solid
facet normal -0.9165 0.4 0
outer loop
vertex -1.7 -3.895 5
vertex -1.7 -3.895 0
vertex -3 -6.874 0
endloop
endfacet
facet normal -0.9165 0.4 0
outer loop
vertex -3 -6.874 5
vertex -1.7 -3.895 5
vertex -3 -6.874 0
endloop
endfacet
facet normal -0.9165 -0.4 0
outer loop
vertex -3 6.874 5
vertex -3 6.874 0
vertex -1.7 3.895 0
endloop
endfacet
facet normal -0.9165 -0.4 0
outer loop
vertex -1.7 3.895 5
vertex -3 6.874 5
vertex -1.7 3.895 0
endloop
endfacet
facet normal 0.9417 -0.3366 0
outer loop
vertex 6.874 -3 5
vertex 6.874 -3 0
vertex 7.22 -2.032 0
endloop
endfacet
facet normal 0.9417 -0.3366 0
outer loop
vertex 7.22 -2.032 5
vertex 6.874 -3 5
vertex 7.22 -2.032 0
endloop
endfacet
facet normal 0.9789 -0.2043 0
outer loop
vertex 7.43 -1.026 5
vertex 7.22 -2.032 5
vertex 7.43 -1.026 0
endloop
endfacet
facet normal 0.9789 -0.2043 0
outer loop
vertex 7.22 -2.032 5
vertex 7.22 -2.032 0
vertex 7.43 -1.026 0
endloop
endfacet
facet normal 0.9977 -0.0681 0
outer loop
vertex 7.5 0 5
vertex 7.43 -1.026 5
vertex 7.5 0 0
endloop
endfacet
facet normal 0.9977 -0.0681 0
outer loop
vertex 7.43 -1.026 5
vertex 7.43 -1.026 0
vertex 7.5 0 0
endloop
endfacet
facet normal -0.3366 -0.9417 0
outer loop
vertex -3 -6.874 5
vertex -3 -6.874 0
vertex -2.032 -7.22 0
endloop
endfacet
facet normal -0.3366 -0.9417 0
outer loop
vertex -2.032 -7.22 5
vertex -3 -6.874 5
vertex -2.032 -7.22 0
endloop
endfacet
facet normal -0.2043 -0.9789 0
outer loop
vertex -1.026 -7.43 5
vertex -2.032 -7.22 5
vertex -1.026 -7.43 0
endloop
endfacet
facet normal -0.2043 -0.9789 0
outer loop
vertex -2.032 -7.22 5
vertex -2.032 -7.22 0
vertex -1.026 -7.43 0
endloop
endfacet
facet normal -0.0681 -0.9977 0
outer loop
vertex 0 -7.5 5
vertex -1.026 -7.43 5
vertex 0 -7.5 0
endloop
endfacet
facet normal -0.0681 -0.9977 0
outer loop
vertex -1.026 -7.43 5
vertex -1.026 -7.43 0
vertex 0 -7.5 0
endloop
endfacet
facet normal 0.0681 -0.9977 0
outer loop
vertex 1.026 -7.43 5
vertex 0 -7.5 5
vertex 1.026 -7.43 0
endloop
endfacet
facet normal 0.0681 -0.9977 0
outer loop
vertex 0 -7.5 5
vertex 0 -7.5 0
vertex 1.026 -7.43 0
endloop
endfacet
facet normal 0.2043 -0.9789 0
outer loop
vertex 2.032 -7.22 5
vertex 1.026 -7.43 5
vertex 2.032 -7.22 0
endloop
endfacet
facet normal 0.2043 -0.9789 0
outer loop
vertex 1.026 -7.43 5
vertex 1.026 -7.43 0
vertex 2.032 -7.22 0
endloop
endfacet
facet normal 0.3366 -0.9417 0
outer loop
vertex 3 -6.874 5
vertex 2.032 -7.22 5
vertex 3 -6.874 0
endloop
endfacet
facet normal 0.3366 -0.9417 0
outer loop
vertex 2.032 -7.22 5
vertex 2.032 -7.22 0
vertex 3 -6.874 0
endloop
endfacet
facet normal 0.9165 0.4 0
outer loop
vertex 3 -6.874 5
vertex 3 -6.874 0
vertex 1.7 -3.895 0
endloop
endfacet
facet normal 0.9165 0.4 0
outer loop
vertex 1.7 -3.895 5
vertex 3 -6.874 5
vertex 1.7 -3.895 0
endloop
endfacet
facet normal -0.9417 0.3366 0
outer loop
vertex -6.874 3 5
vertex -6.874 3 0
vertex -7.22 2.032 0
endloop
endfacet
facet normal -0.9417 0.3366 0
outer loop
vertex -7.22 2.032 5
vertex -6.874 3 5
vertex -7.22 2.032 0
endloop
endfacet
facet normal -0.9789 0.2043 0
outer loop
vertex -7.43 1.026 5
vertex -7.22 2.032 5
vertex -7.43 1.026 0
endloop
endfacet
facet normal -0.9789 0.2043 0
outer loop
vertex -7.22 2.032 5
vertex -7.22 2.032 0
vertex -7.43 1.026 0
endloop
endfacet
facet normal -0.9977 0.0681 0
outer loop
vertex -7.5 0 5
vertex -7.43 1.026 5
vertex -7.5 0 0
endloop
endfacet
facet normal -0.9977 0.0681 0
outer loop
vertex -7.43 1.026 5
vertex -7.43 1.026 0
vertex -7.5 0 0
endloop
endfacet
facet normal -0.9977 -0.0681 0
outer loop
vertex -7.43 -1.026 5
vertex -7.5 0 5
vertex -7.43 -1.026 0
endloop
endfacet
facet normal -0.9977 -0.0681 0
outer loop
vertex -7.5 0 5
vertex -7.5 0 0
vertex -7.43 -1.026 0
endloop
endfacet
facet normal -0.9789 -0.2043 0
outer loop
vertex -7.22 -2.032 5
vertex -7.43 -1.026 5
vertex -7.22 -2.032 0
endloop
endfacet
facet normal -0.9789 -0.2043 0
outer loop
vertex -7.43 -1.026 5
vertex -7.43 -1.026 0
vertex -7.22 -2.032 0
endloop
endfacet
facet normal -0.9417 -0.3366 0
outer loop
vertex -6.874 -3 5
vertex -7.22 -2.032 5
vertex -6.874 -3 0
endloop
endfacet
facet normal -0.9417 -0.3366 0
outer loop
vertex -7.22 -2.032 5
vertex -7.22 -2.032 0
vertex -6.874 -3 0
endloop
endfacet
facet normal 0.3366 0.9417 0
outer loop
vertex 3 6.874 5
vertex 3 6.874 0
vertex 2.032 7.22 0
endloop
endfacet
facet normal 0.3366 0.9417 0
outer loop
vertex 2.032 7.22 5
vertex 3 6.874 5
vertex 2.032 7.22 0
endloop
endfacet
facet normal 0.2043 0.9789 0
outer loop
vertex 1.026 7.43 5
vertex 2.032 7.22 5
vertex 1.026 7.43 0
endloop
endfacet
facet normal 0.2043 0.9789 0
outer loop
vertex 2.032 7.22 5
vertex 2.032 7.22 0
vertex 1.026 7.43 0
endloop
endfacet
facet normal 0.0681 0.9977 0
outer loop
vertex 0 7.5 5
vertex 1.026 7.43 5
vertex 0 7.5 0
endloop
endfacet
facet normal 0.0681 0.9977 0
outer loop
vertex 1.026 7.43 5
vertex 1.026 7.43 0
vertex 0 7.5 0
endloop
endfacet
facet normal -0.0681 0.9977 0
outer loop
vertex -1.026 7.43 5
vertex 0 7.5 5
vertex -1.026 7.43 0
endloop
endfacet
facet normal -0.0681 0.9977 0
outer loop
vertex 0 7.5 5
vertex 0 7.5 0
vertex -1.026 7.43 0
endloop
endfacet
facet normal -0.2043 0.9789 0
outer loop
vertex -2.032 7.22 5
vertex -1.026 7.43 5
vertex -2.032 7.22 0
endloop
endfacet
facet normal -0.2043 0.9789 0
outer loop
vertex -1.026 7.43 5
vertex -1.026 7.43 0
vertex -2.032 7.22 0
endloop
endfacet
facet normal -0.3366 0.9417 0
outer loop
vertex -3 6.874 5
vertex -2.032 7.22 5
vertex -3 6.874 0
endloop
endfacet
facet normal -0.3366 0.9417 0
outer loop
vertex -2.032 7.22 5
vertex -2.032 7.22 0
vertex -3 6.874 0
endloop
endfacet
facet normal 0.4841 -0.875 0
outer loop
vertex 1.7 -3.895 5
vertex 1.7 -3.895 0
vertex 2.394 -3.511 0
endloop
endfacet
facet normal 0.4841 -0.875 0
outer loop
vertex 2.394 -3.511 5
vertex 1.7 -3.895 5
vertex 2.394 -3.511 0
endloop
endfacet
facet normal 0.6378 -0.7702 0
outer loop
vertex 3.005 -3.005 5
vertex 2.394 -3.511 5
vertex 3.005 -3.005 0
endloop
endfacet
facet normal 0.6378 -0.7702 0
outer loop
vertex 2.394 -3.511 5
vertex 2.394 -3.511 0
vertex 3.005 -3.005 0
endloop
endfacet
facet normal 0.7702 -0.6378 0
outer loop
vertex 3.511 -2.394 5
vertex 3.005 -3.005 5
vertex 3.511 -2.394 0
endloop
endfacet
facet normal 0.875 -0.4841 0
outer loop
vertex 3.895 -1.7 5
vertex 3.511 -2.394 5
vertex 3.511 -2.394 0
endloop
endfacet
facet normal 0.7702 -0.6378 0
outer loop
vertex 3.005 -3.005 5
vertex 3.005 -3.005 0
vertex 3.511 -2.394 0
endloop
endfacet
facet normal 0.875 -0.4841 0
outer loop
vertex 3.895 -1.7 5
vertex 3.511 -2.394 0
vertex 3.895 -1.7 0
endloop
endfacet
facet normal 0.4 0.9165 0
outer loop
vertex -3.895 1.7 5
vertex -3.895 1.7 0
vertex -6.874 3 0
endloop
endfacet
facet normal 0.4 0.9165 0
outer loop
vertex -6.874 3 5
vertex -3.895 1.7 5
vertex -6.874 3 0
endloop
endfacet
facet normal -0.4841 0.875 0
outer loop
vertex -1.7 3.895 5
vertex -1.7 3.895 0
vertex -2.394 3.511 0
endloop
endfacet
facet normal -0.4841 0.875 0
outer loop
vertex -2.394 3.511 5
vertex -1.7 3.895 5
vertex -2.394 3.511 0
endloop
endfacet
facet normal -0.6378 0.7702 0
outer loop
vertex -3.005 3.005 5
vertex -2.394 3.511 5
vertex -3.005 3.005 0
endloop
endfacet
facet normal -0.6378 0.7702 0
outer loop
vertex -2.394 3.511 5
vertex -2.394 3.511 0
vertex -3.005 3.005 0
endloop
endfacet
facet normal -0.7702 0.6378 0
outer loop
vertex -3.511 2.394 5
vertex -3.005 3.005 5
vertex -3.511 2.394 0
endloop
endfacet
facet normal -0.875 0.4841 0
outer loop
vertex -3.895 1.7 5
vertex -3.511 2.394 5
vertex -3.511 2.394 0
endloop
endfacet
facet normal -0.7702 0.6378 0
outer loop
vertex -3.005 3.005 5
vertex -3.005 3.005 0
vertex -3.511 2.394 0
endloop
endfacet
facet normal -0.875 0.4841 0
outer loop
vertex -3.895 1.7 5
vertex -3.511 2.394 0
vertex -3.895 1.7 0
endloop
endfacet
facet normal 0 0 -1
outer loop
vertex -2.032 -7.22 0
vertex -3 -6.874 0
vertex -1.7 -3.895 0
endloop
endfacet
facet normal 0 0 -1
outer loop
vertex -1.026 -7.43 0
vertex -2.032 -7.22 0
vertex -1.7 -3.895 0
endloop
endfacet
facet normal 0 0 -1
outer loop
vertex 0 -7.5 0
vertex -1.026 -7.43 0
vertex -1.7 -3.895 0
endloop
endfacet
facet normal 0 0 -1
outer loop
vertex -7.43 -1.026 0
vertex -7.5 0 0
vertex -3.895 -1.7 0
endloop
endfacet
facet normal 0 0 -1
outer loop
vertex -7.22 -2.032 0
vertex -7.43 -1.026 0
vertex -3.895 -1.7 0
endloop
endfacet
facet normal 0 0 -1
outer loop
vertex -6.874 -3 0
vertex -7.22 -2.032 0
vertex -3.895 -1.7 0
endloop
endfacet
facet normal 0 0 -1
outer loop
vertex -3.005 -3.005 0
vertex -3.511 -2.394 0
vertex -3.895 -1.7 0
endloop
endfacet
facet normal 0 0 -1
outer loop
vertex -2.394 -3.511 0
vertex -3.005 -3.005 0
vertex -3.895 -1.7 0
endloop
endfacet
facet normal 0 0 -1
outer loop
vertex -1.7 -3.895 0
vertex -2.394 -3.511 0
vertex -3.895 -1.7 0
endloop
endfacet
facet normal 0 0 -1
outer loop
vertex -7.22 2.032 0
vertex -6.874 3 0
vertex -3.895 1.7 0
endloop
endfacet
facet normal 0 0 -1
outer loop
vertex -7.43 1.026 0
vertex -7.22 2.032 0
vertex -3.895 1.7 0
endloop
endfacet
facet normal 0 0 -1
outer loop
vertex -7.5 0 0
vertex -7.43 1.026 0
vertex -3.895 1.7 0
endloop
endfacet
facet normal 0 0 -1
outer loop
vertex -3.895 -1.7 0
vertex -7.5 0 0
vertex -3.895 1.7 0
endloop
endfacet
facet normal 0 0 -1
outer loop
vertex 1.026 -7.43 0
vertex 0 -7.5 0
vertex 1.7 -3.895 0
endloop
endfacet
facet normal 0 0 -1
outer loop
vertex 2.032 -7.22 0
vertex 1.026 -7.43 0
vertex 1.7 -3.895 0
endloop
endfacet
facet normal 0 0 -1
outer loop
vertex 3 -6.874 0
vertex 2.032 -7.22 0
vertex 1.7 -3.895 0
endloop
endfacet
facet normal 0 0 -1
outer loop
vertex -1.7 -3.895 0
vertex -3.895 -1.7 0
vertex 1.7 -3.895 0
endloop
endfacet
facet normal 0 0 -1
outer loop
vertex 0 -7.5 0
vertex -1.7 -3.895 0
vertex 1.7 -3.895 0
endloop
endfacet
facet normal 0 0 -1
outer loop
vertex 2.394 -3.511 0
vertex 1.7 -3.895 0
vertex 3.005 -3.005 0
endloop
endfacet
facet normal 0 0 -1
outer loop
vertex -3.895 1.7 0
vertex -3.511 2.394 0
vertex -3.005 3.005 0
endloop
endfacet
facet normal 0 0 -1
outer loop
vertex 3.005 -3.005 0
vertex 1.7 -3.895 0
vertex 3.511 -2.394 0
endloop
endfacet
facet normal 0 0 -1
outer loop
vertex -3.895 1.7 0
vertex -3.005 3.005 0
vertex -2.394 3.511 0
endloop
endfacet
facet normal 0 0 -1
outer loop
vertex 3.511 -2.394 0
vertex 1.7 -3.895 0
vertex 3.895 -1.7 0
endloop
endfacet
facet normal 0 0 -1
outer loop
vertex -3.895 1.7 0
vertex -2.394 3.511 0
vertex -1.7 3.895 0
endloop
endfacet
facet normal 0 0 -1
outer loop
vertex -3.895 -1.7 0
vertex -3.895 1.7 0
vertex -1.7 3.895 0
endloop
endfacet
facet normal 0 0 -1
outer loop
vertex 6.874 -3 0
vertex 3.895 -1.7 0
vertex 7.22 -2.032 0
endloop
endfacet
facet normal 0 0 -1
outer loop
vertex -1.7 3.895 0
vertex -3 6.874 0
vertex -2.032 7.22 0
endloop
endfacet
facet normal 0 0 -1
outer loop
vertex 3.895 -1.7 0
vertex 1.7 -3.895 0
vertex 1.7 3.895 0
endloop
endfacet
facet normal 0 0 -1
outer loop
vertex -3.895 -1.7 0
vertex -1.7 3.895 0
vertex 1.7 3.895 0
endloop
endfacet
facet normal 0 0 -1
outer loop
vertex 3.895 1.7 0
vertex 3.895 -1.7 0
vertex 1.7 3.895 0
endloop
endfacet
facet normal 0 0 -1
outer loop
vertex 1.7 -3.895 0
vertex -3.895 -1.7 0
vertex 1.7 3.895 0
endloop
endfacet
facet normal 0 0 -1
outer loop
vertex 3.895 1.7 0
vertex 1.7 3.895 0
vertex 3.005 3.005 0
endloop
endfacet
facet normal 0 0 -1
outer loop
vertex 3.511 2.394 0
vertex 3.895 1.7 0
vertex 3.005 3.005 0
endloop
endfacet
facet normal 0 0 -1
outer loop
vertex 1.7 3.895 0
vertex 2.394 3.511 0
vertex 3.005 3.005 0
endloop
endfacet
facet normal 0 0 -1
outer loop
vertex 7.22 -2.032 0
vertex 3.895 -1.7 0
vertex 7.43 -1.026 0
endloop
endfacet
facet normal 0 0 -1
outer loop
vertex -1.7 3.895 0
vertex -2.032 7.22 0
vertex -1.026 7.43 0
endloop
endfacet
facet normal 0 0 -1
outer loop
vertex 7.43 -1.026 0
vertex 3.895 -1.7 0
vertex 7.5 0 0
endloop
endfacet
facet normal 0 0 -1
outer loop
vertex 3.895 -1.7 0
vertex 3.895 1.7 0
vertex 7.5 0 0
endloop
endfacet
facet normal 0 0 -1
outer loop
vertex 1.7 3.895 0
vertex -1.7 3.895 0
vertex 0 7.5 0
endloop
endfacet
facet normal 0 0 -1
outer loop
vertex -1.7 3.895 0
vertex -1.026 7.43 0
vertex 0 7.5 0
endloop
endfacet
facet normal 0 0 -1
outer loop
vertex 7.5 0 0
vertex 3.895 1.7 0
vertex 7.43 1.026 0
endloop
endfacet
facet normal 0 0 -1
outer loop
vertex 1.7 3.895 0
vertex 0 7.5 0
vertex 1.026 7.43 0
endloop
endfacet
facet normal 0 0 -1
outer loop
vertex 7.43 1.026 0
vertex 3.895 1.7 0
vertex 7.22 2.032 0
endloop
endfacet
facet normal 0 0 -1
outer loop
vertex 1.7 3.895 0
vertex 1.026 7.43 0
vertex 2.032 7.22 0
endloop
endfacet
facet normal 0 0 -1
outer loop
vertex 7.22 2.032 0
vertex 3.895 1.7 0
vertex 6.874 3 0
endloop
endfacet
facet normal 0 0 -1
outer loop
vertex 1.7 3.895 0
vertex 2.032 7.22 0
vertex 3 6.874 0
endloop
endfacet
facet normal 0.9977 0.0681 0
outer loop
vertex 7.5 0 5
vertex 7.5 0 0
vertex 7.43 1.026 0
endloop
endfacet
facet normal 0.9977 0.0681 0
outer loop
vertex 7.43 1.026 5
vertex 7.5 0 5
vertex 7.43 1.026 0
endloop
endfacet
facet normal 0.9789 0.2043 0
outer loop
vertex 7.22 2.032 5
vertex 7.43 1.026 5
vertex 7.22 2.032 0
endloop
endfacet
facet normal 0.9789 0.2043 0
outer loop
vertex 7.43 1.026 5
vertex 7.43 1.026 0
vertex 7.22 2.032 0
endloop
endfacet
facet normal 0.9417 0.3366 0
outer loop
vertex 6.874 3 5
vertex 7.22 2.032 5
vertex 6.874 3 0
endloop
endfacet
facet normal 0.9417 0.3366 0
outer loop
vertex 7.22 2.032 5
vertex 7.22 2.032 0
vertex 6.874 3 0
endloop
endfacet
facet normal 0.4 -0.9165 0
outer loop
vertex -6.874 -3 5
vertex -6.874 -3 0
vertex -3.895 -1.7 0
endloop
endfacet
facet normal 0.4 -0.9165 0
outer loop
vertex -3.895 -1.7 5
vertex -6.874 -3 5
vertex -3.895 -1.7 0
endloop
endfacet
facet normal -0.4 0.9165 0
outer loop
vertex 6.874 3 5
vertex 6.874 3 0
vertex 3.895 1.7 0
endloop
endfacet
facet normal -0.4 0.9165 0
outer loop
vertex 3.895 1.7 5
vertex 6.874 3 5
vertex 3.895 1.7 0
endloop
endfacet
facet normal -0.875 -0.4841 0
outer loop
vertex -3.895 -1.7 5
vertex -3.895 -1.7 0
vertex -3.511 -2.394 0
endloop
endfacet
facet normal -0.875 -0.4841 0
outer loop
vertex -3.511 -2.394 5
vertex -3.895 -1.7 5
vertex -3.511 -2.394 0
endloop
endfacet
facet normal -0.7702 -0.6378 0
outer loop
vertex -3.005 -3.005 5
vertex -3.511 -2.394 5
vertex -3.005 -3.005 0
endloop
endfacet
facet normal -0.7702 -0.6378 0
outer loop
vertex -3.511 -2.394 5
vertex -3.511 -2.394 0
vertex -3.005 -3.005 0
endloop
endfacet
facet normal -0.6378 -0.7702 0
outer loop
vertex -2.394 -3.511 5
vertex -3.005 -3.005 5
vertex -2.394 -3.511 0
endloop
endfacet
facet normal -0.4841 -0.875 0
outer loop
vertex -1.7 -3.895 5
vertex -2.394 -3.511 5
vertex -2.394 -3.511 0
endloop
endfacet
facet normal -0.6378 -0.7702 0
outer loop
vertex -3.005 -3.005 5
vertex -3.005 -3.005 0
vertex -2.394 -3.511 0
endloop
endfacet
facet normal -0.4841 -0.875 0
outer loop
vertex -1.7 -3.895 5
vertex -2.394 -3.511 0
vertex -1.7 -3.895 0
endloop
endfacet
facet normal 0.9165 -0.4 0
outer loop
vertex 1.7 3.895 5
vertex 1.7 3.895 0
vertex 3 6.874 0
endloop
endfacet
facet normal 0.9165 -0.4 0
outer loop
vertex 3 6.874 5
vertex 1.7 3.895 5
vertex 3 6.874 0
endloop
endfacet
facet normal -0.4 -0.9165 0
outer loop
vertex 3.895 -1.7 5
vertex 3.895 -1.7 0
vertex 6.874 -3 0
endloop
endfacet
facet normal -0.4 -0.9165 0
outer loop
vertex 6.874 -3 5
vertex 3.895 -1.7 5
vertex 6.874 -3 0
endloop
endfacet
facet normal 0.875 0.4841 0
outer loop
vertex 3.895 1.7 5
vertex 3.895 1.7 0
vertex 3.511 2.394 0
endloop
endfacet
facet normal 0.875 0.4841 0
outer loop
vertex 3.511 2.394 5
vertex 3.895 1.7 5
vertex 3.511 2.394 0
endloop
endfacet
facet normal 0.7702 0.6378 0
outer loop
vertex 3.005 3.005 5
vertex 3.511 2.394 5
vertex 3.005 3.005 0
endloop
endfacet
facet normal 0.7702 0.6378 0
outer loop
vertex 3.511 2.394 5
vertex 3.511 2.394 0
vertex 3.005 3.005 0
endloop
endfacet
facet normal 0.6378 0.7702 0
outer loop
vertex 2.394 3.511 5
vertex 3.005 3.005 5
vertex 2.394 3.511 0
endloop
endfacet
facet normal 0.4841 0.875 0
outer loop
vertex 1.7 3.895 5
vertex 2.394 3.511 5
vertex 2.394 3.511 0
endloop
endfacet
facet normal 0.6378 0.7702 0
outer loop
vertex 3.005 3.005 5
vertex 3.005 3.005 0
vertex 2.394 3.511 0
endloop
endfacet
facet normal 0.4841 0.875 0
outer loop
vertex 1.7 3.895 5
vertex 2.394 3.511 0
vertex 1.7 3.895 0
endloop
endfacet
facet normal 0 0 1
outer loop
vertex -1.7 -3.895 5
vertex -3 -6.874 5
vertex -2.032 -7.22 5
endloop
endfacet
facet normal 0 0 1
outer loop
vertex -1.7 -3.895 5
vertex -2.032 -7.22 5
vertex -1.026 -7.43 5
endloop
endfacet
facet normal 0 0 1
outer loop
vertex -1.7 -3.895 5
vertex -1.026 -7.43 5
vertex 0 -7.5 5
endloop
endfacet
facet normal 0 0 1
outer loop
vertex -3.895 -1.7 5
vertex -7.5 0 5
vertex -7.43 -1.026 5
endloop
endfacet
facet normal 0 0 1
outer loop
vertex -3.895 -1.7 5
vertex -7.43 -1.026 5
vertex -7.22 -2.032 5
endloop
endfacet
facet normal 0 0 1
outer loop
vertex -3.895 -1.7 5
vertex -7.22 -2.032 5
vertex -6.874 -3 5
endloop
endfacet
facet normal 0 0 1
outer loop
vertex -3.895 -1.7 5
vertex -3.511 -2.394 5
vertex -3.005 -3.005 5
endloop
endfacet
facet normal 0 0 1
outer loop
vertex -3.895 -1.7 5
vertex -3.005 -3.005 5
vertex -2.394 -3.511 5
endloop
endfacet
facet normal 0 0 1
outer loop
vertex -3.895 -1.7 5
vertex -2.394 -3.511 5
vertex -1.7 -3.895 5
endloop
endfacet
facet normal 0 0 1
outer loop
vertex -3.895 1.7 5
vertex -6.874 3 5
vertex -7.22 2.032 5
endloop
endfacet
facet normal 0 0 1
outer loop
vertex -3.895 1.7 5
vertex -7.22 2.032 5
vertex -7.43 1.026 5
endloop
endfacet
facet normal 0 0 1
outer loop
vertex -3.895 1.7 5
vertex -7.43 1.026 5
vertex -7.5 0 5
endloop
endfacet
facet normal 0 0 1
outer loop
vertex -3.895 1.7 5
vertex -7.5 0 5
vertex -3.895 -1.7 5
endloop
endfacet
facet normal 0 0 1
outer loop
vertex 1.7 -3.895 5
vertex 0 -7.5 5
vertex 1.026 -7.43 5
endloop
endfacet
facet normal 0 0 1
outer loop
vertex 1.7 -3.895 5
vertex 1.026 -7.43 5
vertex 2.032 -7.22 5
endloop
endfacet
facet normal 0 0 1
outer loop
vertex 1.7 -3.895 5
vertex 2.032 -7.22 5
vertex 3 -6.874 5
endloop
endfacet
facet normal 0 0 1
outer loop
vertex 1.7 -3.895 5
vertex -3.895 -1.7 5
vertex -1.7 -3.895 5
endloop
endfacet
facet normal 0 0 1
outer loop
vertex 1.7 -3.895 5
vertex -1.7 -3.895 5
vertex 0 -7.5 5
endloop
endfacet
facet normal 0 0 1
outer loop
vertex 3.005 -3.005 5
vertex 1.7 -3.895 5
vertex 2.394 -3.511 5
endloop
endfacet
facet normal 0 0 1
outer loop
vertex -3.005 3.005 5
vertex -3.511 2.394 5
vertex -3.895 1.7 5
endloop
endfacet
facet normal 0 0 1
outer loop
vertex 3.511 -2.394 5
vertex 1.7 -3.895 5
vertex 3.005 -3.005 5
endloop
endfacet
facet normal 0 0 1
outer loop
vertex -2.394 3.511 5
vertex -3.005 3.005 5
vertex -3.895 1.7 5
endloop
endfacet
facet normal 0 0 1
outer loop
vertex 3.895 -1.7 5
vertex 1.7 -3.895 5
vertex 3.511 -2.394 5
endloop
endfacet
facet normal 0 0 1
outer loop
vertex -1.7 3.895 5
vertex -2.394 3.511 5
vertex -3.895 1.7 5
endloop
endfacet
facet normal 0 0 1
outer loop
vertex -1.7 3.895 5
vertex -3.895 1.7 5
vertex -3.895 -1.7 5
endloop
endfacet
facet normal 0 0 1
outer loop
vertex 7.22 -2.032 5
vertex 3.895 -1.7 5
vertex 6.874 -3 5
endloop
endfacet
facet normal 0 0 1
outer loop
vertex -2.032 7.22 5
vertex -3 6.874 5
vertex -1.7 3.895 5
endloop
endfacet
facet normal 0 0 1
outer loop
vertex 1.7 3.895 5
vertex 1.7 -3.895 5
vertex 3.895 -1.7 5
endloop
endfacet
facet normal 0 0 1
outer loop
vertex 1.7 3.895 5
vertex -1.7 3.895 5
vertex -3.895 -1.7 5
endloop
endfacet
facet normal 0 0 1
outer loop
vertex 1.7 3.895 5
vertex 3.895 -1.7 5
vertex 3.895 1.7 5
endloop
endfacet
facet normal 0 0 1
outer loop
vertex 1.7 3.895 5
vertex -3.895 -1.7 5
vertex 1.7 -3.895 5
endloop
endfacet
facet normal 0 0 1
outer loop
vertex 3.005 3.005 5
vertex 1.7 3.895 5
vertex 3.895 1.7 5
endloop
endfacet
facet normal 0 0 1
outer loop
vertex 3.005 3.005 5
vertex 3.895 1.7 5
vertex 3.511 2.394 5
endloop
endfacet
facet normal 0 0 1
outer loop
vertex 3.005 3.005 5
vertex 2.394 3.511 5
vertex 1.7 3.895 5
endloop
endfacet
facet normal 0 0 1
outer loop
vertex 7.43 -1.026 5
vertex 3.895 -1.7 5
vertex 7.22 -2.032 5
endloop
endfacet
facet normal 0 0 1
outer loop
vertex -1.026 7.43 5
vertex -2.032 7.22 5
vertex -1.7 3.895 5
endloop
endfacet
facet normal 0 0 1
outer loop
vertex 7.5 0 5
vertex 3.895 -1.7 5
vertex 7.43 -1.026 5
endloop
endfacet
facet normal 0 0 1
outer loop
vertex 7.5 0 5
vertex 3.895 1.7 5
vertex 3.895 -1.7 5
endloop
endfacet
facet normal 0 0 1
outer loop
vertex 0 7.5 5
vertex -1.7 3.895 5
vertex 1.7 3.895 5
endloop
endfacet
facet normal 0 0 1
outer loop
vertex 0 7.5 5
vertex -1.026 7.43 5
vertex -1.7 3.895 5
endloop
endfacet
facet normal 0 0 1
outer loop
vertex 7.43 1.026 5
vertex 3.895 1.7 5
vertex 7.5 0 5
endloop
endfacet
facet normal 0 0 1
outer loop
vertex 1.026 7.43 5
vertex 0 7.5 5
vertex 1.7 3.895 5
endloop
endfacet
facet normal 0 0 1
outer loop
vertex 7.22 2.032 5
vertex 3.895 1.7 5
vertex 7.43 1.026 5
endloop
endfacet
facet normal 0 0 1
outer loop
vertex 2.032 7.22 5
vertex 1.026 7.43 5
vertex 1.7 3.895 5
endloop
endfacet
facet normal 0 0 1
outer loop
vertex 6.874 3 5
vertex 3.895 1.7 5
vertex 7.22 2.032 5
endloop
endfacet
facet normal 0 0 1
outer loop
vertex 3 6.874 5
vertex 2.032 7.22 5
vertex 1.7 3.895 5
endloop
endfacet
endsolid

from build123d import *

# Parameters (mm, degrees)
F1_DEPTH = 5


with BuildPart() as f1:
    # F0 (on Top) → F1 (new body)
    with BuildSketch(Plane.XY):
        with BuildLine():
            Line((1.7, 3.895189), (3, 6.873864))
            ThreePointArc((3, 6.873864), (0, 7.5), (-3, 6.873864))
            Line((-3, 6.873864), (-1.7, 3.895189))
            ThreePointArc((-1.7, 3.895189), (0, 4.25), (1.7, 3.895189))
        make_face()
        with BuildLine():
            ThreePointArc((6.873864, -3), (7.341797, -1.532322), (7.5, 0))
            ThreePointArc((7.5, 0), (7.341797, 1.532322), (6.873864, 3))
            Line((6.873864, 3), (3.895189, 1.7))
            ThreePointArc((3.895189, 1.7), (4.160352, 0.868316), (4.25, 0))
            ThreePointArc((4.25, 0), (4.160352, -0.868316), (3.895189, -1.7))
            Line((3.895189, -1.7), (6.873864, -3))
        make_face()
        with BuildLine():
            ThreePointArc((-3, -6.873864), (0, -7.5), (3, -6.873864))
            Line((3, -6.873864), (1.7, -3.895189))
            ThreePointArc((1.7, -3.895189), (0, -4.25), (-1.7, -3.895189))
            Line((-1.7, -3.895189), (-3, -6.873864))
        make_face()
        with BuildLine():
            Line((-3.895189, 1.7), (-6.873864, 3))
            ThreePointArc((-6.873864, 3), (-7.5, 0), (-6.873864, -3))
            Line((-6.873864, -3), (-3.895189, -1.7))
            ThreePointArc((-3.895189, -1.7), (-4.25, 0), (-3.895189, 1.7))
        make_face()
        with BuildLine():
            ThreePointArc((4.25, 0), (4.160352, 0.868316), (3.895189, 1.7))
            ThreePointArc((3.895189, 1.7), (3.005204, 3.005204), (1.7, 3.895189))
            ThreePointArc((1.7, 3.895189), (0, 4.25), (-1.7, 3.895189))
            ThreePointArc((-1.7, 3.895189), (-3.005204, 3.005204), (-3.895189, 1.7))
            ThreePointArc((-3.895189, 1.7), (-4.25, 0), (-3.895189, -1.7))
            ThreePointArc((-3.895189, -1.7), (-3.005204, -3.005204), (-1.7, -3.895189))
            ThreePointArc((-1.7, -3.895189), (0, -4.25), (1.7, -3.895189))
            ThreePointArc((1.7, -3.895189), (3.005204, -3.005204), (3.895189, -1.7))
            ThreePointArc((3.895189, -1.7), (4.160352, -0.868316), (4.25, 0))
        make_face()
    extrude(amount=F1_DEPTH)


solid = f1.part
